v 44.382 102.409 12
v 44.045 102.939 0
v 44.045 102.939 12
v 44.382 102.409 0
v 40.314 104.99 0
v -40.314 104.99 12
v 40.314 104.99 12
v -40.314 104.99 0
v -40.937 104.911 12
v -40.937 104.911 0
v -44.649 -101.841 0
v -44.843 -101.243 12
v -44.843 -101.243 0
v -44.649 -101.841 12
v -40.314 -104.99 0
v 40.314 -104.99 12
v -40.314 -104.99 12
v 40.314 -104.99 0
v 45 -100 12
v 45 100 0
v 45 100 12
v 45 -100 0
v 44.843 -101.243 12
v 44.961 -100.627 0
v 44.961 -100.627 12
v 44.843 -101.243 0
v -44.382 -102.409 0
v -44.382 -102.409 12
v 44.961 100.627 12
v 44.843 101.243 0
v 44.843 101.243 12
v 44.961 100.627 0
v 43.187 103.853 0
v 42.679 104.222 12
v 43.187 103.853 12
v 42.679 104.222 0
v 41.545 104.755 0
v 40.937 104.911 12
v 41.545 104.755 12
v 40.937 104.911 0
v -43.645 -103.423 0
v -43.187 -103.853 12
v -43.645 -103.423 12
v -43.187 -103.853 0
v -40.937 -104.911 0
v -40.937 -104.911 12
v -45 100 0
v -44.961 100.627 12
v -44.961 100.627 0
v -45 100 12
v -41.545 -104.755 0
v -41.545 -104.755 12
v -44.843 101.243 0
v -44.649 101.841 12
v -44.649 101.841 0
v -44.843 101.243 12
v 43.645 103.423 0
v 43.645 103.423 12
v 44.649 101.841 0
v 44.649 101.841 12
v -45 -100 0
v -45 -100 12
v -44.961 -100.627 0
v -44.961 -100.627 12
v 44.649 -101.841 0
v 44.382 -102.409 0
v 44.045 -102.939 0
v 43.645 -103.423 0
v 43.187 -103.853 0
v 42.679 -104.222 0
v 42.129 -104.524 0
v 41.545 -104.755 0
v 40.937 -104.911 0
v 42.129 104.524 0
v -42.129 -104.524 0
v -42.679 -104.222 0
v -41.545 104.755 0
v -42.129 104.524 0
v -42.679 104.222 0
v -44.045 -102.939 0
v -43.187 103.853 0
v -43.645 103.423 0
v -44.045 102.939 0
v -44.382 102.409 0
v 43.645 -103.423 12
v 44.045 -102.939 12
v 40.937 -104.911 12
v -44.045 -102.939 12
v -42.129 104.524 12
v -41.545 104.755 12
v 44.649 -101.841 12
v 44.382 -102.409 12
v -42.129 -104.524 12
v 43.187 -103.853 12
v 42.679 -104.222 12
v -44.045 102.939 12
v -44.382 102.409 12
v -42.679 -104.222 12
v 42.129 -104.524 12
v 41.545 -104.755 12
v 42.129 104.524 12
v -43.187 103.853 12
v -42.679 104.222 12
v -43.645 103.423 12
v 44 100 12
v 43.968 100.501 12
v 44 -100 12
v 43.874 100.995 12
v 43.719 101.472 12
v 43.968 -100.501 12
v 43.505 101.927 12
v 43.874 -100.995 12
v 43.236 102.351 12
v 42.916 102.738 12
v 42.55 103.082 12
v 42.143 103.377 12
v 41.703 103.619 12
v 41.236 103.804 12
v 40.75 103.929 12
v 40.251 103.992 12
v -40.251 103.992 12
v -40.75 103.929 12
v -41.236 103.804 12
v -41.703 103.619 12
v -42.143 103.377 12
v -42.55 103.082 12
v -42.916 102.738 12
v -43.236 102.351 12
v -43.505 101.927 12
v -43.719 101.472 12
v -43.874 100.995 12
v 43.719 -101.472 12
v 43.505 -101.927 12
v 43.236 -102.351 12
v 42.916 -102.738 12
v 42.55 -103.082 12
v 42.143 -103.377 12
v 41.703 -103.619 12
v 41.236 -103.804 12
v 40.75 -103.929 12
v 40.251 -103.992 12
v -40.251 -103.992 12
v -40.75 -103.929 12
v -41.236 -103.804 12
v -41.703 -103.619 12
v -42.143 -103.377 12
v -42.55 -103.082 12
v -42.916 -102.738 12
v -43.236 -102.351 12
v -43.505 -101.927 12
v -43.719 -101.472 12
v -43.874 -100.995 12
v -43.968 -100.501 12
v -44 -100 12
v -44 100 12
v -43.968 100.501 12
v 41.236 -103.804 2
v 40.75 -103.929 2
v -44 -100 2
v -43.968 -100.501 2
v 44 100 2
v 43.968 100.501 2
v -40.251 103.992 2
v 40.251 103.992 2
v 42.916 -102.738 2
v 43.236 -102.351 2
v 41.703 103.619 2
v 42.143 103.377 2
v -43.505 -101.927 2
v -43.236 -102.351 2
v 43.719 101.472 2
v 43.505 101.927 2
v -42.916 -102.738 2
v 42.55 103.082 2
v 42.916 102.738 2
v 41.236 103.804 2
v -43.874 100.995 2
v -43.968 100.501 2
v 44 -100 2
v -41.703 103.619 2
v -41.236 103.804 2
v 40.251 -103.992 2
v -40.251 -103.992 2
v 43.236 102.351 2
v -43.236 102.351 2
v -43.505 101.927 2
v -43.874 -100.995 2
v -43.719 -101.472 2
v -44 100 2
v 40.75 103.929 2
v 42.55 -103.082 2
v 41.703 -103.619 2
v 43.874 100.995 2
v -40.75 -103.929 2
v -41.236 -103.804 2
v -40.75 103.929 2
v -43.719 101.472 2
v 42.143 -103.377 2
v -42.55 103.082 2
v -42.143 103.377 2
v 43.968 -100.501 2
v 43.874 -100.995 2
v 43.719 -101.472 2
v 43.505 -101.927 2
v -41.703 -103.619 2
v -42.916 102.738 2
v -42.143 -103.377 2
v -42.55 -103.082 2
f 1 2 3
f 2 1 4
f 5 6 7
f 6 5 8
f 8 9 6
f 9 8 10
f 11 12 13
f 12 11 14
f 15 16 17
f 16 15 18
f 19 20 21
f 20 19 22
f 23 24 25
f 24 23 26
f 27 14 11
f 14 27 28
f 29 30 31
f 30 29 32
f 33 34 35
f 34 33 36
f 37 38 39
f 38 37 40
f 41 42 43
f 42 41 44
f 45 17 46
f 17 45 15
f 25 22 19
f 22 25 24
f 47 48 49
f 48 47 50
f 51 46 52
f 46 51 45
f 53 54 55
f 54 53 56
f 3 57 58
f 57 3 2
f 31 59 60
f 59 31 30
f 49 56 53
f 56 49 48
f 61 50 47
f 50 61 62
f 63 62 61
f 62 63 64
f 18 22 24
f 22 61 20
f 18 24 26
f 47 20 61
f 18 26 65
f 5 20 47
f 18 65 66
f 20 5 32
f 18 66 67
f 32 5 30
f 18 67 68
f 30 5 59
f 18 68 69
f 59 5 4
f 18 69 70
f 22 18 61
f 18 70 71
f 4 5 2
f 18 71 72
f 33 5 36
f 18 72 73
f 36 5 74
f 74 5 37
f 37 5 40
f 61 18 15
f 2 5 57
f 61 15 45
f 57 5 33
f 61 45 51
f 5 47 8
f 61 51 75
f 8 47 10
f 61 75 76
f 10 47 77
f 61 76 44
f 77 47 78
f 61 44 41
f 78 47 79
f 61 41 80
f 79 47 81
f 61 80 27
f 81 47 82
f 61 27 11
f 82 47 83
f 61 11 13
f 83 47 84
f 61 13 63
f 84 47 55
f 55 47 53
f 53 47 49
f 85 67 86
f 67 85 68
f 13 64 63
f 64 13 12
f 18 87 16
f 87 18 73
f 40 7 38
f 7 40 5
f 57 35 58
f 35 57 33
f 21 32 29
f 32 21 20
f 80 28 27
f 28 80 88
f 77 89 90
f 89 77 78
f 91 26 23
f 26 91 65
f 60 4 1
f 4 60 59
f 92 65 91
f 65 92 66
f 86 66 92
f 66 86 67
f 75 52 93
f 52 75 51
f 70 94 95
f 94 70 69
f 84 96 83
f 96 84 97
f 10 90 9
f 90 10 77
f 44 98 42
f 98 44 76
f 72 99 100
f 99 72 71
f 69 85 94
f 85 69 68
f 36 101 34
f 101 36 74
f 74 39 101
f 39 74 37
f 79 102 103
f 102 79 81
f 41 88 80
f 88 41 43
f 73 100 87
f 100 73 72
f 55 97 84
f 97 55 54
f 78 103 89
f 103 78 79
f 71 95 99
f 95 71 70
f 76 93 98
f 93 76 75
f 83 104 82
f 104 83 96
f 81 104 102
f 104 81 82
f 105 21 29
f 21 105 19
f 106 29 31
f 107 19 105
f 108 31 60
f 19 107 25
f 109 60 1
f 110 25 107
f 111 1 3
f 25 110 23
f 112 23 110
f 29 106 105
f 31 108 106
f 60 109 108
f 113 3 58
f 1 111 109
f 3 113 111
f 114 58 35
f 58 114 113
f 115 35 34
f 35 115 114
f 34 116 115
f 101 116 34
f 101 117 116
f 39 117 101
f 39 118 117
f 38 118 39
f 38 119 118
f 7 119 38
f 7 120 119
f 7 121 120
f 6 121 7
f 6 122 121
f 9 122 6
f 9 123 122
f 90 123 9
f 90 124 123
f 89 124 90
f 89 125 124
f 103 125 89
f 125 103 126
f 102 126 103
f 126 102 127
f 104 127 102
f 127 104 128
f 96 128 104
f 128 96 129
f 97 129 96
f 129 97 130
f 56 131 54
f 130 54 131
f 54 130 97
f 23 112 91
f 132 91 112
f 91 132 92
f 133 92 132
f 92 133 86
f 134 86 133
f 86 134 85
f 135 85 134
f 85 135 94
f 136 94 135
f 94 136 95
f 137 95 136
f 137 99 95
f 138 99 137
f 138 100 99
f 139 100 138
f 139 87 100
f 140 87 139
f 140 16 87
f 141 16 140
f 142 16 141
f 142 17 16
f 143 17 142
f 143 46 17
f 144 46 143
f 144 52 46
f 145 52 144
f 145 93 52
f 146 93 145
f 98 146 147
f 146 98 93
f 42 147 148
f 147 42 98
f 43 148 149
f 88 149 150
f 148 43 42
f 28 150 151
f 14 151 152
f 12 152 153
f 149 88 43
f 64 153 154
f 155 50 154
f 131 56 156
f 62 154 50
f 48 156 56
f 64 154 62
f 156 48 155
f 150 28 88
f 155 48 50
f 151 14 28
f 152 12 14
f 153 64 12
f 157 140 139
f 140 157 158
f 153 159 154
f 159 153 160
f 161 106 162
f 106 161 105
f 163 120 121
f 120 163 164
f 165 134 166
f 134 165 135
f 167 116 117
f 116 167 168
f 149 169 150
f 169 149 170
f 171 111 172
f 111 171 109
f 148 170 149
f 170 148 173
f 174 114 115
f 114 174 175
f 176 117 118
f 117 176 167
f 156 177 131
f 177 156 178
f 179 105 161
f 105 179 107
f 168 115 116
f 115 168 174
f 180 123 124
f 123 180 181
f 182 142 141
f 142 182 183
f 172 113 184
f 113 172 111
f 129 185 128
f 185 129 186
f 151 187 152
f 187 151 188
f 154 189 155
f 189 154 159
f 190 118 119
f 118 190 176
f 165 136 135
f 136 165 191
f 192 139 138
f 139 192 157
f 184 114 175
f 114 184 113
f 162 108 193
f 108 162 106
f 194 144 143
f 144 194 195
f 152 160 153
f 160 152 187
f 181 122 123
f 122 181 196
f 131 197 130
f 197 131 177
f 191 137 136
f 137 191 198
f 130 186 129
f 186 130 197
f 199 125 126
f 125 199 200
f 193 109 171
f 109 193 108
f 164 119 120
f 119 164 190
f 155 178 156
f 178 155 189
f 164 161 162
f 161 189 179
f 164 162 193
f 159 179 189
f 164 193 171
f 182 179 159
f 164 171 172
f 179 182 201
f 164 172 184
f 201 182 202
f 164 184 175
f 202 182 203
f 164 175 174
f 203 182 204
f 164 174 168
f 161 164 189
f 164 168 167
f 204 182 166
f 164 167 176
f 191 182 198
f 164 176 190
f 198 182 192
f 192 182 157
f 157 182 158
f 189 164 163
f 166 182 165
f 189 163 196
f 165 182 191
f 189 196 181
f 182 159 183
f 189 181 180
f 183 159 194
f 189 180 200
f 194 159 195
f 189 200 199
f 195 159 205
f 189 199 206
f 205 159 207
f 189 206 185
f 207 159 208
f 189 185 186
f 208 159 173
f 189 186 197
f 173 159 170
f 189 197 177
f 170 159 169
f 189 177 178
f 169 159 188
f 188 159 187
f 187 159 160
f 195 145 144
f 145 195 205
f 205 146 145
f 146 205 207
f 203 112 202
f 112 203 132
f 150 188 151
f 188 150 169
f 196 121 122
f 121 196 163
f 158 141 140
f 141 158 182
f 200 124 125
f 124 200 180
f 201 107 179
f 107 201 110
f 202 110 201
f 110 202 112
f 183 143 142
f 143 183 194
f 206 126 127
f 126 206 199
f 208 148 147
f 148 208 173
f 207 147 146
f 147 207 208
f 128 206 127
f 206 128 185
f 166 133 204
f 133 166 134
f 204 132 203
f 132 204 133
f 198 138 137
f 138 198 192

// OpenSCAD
$fn = 50;


difference() {
	union() {
		hull() {
			translate(v = [-40.0000000000, 100.0000000000, 0]) {
				cylinder(h = 12, r = 5);
			}
			translate(v = [40.0000000000, 100.0000000000, 0]) {
				cylinder(h = 12, r = 5);
			}
			translate(v = [-40.0000000000, -100.0000000000, 0]) {
				cylinder(h = 12, r = 5);
			}
			translate(v = [40.0000000000, -100.0000000000, 0]) {
				cylinder(h = 12, r = 5);
			}
		}
	}
	union() {
		translate(v = [0, 0, 2]) {
			hull() {
				translate(v = [-40.0000000000, 100.0000000000, 0]) {
					cylinder(h = 10, r = 4);
				}
				translate(v = [40.0000000000, 100.0000000000, 0]) {
					cylinder(h = 10, r = 4);
				}
				translate(v = [-40.0000000000, -100.0000000000, 0]) {
					cylinder(h = 10, r = 4);
				}
				translate(v = [40.0000000000, -100.0000000000, 0]) {
					cylinder(h = 10, r = 4);
				}
			}
		}
	}
}
